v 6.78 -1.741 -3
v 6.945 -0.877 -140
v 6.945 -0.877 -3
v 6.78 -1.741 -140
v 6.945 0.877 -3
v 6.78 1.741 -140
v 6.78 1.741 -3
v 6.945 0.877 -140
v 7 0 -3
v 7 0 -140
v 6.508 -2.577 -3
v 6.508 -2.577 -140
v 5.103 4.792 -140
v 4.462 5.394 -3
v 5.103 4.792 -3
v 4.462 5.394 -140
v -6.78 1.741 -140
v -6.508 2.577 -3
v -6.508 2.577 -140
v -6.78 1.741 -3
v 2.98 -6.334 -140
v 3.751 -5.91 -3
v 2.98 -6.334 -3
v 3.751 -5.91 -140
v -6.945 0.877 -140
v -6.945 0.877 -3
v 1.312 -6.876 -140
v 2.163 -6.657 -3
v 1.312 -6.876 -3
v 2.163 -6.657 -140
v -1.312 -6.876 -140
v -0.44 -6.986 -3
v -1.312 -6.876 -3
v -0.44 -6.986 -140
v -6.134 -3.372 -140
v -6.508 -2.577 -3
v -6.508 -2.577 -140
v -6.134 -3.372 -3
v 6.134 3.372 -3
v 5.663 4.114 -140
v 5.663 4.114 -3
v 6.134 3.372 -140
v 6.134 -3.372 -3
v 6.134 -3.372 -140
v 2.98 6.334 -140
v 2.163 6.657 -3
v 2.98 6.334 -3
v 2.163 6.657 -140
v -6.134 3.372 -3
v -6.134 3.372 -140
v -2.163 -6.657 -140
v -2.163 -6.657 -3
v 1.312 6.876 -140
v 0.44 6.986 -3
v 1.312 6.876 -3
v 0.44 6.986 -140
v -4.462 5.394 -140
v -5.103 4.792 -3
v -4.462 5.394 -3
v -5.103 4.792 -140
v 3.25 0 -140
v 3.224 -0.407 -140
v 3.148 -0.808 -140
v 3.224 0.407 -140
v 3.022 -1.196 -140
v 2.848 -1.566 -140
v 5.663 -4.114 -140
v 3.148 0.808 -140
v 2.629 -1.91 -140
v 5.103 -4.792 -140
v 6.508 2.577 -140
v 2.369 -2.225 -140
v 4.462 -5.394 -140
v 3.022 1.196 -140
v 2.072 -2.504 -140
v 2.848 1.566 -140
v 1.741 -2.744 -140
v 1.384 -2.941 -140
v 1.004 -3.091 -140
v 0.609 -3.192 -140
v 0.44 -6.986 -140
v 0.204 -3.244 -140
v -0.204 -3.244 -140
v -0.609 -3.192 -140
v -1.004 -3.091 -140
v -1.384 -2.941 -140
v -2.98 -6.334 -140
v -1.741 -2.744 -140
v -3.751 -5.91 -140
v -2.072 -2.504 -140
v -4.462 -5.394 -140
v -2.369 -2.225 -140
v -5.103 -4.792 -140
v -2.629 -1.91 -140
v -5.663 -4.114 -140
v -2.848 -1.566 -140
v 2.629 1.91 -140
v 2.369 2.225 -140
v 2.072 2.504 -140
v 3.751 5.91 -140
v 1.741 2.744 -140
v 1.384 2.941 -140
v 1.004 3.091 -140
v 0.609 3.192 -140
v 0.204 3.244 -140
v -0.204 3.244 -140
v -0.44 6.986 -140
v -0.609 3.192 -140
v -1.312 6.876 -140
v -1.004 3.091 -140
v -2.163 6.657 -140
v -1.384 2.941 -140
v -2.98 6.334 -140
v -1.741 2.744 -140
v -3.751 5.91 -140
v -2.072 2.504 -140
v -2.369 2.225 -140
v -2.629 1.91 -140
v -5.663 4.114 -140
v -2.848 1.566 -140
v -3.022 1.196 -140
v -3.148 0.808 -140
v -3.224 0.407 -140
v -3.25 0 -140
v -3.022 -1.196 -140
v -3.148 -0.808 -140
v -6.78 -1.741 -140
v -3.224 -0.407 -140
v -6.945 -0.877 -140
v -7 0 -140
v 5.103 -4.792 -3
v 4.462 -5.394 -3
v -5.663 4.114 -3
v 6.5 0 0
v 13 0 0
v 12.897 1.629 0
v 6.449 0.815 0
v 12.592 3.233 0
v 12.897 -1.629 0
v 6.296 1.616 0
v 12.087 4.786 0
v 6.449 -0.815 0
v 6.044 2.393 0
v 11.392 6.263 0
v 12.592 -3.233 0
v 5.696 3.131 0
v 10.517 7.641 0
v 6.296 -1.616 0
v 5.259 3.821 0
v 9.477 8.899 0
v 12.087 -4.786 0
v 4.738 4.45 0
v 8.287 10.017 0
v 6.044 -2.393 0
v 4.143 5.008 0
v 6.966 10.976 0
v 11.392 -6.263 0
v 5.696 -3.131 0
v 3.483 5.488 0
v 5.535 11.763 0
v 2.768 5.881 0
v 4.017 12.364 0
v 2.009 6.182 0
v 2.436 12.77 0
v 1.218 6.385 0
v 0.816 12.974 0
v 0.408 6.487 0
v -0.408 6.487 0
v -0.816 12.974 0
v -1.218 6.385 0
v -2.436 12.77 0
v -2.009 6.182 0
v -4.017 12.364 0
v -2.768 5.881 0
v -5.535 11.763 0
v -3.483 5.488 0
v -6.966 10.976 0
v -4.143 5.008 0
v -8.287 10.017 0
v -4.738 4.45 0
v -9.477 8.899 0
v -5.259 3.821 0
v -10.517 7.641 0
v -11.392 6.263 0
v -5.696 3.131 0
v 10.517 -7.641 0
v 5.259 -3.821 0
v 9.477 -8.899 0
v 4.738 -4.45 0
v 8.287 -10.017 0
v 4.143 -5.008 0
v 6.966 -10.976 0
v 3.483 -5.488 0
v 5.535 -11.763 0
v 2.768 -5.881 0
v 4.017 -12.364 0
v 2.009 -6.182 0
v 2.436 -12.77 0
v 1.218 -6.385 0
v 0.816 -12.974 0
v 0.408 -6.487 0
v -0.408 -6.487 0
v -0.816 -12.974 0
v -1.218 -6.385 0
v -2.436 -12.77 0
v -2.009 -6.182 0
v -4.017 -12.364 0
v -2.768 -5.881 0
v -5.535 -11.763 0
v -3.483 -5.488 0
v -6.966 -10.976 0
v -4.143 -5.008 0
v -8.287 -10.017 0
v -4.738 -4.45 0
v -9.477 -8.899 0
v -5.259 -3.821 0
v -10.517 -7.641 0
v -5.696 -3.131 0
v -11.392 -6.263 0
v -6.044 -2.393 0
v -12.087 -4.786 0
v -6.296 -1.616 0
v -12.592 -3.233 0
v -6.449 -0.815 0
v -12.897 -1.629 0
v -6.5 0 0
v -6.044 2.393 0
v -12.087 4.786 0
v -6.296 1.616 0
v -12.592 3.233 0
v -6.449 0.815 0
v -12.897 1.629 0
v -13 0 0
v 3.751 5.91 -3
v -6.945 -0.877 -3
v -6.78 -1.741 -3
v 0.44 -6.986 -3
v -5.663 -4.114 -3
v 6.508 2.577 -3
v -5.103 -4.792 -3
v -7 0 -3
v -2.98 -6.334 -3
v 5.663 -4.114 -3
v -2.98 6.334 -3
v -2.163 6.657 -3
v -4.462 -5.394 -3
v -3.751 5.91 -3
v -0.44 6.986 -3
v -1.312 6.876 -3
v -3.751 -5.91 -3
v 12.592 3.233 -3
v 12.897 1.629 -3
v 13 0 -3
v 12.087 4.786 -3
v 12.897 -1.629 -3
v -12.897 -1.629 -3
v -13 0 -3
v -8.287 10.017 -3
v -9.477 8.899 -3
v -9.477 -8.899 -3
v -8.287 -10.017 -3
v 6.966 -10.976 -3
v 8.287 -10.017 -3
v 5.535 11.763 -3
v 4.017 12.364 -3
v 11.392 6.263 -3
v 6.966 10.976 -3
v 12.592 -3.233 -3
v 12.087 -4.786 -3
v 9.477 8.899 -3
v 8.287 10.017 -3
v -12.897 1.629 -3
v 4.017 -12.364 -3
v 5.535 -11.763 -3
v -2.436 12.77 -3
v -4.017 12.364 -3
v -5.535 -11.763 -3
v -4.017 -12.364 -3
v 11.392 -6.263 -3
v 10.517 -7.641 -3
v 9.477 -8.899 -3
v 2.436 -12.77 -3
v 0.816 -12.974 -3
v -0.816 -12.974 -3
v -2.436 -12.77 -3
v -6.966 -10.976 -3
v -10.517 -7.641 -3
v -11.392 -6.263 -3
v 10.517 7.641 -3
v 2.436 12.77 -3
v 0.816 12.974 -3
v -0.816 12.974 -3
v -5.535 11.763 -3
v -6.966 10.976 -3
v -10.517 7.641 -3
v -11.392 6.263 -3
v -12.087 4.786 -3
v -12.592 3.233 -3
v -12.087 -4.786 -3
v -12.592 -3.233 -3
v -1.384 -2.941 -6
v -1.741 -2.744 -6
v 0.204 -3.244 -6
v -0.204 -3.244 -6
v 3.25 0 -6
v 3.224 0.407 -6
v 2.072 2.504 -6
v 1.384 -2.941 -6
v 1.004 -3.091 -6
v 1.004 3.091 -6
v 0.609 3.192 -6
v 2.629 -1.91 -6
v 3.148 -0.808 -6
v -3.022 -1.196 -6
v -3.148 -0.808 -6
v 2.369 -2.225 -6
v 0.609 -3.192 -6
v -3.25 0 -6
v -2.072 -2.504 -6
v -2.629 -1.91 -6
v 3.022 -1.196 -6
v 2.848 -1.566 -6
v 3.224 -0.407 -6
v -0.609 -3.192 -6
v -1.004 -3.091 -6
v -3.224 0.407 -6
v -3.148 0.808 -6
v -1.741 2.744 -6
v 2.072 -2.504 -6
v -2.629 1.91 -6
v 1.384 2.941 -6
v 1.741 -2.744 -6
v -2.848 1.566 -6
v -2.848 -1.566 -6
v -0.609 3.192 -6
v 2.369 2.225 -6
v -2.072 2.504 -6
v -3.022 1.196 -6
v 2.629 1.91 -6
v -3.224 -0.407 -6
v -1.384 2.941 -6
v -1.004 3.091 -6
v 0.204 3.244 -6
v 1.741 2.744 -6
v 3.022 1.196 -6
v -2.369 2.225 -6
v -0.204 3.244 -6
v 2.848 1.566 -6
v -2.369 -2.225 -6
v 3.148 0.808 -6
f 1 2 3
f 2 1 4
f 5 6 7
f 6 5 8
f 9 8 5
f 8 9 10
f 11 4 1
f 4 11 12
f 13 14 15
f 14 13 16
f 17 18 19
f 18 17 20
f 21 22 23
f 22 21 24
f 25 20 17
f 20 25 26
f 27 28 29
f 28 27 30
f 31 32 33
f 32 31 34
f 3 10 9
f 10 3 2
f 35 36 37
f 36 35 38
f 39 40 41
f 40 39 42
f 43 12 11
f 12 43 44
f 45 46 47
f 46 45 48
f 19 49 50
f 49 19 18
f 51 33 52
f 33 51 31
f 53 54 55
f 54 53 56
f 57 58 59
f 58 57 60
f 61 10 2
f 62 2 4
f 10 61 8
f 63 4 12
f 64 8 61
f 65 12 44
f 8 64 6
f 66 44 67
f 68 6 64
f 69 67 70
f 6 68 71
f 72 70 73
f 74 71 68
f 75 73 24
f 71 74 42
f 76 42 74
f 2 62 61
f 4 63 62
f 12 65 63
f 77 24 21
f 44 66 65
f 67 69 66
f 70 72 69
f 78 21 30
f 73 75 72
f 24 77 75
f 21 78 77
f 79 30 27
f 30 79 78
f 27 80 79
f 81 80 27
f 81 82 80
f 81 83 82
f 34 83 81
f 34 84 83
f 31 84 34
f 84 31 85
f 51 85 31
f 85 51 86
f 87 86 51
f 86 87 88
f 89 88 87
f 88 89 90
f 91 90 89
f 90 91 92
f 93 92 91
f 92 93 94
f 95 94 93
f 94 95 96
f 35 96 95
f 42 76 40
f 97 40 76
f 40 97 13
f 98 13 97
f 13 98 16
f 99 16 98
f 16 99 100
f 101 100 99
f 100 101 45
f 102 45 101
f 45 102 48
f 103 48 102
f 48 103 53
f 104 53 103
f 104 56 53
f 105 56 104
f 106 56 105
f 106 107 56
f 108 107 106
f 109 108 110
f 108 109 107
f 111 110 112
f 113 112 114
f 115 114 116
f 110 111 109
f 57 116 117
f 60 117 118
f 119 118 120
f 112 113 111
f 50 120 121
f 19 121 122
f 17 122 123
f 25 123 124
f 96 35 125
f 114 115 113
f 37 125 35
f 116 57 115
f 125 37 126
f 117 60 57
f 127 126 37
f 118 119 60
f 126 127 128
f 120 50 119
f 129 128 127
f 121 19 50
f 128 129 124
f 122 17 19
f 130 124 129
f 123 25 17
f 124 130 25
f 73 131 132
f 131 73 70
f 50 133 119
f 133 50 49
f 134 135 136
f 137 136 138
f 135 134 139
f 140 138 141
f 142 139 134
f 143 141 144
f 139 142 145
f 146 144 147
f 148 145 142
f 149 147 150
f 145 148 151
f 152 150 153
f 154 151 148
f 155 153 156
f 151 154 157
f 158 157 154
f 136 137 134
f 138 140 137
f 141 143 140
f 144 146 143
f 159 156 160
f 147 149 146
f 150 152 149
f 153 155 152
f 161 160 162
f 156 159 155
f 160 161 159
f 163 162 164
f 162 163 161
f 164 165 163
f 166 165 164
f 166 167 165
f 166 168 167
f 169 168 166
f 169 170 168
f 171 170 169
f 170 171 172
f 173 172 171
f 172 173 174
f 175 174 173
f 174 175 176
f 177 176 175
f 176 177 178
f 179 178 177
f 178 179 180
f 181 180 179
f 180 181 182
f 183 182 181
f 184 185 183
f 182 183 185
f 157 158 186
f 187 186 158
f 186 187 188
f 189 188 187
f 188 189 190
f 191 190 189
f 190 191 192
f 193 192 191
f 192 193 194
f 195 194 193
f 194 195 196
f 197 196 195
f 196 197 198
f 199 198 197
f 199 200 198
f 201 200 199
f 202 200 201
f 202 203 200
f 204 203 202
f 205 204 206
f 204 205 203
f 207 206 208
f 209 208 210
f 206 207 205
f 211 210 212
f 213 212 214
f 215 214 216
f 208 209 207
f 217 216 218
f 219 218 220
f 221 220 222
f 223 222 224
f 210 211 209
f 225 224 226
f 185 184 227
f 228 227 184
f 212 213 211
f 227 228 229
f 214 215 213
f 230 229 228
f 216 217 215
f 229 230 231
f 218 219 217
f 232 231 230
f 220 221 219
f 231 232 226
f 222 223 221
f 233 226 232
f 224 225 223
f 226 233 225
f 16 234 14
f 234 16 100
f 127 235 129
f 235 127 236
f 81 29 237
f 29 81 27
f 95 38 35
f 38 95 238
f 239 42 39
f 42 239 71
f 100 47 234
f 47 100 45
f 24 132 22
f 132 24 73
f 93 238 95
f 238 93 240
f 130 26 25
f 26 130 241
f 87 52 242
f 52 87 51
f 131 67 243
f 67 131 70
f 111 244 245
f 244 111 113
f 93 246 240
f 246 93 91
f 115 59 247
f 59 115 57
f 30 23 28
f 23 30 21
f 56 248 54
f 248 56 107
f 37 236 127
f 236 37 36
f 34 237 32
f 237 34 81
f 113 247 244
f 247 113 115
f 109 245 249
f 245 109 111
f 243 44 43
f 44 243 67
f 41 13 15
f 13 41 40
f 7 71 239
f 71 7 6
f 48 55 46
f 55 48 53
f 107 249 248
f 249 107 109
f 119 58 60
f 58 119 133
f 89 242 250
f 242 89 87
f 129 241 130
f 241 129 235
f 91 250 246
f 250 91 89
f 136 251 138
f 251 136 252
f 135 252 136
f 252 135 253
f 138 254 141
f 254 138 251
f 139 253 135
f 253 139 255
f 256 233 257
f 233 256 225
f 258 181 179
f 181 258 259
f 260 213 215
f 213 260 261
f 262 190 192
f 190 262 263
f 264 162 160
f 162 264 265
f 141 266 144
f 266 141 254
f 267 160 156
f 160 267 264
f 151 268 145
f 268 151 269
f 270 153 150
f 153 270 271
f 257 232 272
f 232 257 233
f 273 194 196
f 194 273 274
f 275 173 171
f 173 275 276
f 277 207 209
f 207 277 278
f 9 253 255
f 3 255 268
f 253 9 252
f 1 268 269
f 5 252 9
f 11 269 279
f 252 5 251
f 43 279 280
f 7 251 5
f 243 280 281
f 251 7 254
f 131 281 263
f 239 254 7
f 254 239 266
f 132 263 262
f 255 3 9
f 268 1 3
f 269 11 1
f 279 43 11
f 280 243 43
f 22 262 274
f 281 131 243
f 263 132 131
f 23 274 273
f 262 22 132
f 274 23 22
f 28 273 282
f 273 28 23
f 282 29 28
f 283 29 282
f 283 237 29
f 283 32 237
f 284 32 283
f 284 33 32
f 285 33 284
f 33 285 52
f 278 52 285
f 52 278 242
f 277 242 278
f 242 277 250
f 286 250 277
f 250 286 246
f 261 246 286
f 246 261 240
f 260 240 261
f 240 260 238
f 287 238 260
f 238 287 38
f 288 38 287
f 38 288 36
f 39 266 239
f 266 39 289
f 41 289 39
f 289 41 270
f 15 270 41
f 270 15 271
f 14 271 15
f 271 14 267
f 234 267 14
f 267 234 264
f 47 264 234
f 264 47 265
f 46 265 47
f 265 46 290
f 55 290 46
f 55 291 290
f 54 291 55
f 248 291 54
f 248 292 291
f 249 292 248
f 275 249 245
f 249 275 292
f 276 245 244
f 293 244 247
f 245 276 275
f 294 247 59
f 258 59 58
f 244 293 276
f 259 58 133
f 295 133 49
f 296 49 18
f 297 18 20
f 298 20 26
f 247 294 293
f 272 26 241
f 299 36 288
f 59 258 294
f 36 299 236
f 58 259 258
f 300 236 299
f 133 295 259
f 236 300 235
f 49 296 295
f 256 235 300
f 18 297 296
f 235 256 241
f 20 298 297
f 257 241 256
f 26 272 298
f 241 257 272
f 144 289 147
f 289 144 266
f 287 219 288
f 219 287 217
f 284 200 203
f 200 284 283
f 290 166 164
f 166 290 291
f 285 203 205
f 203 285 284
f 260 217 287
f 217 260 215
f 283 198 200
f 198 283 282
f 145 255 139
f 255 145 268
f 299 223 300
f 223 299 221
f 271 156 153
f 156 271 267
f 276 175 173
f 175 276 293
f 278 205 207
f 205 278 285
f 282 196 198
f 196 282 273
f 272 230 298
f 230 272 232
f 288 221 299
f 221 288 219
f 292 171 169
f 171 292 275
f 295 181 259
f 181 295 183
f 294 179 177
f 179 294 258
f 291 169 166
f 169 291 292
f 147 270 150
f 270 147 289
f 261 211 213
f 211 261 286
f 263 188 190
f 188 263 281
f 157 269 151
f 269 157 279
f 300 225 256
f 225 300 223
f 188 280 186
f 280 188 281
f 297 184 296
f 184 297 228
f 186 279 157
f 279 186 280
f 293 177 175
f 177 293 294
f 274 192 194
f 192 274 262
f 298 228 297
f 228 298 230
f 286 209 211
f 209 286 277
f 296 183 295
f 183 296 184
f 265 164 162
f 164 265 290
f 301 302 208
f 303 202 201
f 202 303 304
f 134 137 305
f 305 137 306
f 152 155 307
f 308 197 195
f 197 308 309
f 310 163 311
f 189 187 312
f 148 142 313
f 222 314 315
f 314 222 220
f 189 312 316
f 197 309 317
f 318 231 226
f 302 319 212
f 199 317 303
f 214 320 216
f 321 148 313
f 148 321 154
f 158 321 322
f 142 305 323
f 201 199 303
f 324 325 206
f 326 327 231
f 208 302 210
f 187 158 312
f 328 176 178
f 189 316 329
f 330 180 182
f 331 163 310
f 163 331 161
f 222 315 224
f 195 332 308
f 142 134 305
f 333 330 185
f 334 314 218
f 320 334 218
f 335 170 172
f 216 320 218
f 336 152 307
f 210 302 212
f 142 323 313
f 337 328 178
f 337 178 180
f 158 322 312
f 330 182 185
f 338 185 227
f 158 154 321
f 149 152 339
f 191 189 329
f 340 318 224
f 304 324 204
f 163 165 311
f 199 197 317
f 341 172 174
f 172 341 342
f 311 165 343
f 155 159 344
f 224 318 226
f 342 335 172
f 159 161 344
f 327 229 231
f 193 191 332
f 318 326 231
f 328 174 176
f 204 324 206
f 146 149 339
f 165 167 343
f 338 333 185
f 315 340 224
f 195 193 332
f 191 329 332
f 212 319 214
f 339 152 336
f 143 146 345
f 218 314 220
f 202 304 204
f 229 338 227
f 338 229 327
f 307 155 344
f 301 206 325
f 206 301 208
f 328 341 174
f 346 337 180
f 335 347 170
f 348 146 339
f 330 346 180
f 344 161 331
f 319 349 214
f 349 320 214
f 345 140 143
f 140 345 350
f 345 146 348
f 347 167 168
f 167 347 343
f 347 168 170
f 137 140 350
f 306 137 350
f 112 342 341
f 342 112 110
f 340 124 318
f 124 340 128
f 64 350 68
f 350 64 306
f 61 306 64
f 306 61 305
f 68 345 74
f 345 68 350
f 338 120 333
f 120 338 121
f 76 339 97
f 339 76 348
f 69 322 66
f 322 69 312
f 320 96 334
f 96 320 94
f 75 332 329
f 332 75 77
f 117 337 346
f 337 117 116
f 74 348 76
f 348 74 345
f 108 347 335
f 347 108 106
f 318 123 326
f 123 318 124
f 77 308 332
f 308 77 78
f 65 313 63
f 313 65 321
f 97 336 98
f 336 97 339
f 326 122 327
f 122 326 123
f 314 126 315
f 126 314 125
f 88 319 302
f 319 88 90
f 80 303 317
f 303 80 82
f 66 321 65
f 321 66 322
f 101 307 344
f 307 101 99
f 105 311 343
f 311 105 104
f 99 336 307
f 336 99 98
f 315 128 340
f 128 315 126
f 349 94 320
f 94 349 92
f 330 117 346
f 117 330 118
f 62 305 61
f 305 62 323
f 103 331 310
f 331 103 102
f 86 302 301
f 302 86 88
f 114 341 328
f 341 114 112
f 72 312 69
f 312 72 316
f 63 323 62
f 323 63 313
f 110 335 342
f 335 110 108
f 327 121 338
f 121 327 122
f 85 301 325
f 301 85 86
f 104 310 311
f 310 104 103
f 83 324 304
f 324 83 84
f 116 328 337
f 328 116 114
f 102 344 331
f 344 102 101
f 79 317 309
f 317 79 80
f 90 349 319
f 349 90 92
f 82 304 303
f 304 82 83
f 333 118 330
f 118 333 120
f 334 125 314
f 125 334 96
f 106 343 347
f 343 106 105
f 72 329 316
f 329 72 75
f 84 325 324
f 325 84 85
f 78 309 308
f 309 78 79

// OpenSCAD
$fn = 50;


difference() {
	union() {
		translate(v = [0, 0, -140.0000000000]) {
			cylinder(h = 140, r = 7.0000000000);
		}
		translate(v = [0, 0, -3.0000000000]) {
			cylinder(h = 3, r = 13.0000000000);
		}
	}
	union() {
		translate(v = [0, 0, 0]) {
			rotate(a = [0, 0, 0]) {
				difference() {
					union() {
						#translate(v = [0, 0, -140.0000000000]) {
							cylinder(h = 140, r = 2.2500000000);
						}
						#translate(v = [0, 0, -6]) {
							cylinder(h = 6, r1 = 3.2500000000, r2 = 6.5000000000);
						}
						#translate(v = [0, 0, -140.0000000000]) {
							cylinder(h = 140, r = 3.2500000000);
						}
						#translate(v = [0, 0, -140.0000000000]) {
							cylinder(h = 140, r = 2.2500000000);
						}
					}
					union();
				}
			}
		}
	}
}
